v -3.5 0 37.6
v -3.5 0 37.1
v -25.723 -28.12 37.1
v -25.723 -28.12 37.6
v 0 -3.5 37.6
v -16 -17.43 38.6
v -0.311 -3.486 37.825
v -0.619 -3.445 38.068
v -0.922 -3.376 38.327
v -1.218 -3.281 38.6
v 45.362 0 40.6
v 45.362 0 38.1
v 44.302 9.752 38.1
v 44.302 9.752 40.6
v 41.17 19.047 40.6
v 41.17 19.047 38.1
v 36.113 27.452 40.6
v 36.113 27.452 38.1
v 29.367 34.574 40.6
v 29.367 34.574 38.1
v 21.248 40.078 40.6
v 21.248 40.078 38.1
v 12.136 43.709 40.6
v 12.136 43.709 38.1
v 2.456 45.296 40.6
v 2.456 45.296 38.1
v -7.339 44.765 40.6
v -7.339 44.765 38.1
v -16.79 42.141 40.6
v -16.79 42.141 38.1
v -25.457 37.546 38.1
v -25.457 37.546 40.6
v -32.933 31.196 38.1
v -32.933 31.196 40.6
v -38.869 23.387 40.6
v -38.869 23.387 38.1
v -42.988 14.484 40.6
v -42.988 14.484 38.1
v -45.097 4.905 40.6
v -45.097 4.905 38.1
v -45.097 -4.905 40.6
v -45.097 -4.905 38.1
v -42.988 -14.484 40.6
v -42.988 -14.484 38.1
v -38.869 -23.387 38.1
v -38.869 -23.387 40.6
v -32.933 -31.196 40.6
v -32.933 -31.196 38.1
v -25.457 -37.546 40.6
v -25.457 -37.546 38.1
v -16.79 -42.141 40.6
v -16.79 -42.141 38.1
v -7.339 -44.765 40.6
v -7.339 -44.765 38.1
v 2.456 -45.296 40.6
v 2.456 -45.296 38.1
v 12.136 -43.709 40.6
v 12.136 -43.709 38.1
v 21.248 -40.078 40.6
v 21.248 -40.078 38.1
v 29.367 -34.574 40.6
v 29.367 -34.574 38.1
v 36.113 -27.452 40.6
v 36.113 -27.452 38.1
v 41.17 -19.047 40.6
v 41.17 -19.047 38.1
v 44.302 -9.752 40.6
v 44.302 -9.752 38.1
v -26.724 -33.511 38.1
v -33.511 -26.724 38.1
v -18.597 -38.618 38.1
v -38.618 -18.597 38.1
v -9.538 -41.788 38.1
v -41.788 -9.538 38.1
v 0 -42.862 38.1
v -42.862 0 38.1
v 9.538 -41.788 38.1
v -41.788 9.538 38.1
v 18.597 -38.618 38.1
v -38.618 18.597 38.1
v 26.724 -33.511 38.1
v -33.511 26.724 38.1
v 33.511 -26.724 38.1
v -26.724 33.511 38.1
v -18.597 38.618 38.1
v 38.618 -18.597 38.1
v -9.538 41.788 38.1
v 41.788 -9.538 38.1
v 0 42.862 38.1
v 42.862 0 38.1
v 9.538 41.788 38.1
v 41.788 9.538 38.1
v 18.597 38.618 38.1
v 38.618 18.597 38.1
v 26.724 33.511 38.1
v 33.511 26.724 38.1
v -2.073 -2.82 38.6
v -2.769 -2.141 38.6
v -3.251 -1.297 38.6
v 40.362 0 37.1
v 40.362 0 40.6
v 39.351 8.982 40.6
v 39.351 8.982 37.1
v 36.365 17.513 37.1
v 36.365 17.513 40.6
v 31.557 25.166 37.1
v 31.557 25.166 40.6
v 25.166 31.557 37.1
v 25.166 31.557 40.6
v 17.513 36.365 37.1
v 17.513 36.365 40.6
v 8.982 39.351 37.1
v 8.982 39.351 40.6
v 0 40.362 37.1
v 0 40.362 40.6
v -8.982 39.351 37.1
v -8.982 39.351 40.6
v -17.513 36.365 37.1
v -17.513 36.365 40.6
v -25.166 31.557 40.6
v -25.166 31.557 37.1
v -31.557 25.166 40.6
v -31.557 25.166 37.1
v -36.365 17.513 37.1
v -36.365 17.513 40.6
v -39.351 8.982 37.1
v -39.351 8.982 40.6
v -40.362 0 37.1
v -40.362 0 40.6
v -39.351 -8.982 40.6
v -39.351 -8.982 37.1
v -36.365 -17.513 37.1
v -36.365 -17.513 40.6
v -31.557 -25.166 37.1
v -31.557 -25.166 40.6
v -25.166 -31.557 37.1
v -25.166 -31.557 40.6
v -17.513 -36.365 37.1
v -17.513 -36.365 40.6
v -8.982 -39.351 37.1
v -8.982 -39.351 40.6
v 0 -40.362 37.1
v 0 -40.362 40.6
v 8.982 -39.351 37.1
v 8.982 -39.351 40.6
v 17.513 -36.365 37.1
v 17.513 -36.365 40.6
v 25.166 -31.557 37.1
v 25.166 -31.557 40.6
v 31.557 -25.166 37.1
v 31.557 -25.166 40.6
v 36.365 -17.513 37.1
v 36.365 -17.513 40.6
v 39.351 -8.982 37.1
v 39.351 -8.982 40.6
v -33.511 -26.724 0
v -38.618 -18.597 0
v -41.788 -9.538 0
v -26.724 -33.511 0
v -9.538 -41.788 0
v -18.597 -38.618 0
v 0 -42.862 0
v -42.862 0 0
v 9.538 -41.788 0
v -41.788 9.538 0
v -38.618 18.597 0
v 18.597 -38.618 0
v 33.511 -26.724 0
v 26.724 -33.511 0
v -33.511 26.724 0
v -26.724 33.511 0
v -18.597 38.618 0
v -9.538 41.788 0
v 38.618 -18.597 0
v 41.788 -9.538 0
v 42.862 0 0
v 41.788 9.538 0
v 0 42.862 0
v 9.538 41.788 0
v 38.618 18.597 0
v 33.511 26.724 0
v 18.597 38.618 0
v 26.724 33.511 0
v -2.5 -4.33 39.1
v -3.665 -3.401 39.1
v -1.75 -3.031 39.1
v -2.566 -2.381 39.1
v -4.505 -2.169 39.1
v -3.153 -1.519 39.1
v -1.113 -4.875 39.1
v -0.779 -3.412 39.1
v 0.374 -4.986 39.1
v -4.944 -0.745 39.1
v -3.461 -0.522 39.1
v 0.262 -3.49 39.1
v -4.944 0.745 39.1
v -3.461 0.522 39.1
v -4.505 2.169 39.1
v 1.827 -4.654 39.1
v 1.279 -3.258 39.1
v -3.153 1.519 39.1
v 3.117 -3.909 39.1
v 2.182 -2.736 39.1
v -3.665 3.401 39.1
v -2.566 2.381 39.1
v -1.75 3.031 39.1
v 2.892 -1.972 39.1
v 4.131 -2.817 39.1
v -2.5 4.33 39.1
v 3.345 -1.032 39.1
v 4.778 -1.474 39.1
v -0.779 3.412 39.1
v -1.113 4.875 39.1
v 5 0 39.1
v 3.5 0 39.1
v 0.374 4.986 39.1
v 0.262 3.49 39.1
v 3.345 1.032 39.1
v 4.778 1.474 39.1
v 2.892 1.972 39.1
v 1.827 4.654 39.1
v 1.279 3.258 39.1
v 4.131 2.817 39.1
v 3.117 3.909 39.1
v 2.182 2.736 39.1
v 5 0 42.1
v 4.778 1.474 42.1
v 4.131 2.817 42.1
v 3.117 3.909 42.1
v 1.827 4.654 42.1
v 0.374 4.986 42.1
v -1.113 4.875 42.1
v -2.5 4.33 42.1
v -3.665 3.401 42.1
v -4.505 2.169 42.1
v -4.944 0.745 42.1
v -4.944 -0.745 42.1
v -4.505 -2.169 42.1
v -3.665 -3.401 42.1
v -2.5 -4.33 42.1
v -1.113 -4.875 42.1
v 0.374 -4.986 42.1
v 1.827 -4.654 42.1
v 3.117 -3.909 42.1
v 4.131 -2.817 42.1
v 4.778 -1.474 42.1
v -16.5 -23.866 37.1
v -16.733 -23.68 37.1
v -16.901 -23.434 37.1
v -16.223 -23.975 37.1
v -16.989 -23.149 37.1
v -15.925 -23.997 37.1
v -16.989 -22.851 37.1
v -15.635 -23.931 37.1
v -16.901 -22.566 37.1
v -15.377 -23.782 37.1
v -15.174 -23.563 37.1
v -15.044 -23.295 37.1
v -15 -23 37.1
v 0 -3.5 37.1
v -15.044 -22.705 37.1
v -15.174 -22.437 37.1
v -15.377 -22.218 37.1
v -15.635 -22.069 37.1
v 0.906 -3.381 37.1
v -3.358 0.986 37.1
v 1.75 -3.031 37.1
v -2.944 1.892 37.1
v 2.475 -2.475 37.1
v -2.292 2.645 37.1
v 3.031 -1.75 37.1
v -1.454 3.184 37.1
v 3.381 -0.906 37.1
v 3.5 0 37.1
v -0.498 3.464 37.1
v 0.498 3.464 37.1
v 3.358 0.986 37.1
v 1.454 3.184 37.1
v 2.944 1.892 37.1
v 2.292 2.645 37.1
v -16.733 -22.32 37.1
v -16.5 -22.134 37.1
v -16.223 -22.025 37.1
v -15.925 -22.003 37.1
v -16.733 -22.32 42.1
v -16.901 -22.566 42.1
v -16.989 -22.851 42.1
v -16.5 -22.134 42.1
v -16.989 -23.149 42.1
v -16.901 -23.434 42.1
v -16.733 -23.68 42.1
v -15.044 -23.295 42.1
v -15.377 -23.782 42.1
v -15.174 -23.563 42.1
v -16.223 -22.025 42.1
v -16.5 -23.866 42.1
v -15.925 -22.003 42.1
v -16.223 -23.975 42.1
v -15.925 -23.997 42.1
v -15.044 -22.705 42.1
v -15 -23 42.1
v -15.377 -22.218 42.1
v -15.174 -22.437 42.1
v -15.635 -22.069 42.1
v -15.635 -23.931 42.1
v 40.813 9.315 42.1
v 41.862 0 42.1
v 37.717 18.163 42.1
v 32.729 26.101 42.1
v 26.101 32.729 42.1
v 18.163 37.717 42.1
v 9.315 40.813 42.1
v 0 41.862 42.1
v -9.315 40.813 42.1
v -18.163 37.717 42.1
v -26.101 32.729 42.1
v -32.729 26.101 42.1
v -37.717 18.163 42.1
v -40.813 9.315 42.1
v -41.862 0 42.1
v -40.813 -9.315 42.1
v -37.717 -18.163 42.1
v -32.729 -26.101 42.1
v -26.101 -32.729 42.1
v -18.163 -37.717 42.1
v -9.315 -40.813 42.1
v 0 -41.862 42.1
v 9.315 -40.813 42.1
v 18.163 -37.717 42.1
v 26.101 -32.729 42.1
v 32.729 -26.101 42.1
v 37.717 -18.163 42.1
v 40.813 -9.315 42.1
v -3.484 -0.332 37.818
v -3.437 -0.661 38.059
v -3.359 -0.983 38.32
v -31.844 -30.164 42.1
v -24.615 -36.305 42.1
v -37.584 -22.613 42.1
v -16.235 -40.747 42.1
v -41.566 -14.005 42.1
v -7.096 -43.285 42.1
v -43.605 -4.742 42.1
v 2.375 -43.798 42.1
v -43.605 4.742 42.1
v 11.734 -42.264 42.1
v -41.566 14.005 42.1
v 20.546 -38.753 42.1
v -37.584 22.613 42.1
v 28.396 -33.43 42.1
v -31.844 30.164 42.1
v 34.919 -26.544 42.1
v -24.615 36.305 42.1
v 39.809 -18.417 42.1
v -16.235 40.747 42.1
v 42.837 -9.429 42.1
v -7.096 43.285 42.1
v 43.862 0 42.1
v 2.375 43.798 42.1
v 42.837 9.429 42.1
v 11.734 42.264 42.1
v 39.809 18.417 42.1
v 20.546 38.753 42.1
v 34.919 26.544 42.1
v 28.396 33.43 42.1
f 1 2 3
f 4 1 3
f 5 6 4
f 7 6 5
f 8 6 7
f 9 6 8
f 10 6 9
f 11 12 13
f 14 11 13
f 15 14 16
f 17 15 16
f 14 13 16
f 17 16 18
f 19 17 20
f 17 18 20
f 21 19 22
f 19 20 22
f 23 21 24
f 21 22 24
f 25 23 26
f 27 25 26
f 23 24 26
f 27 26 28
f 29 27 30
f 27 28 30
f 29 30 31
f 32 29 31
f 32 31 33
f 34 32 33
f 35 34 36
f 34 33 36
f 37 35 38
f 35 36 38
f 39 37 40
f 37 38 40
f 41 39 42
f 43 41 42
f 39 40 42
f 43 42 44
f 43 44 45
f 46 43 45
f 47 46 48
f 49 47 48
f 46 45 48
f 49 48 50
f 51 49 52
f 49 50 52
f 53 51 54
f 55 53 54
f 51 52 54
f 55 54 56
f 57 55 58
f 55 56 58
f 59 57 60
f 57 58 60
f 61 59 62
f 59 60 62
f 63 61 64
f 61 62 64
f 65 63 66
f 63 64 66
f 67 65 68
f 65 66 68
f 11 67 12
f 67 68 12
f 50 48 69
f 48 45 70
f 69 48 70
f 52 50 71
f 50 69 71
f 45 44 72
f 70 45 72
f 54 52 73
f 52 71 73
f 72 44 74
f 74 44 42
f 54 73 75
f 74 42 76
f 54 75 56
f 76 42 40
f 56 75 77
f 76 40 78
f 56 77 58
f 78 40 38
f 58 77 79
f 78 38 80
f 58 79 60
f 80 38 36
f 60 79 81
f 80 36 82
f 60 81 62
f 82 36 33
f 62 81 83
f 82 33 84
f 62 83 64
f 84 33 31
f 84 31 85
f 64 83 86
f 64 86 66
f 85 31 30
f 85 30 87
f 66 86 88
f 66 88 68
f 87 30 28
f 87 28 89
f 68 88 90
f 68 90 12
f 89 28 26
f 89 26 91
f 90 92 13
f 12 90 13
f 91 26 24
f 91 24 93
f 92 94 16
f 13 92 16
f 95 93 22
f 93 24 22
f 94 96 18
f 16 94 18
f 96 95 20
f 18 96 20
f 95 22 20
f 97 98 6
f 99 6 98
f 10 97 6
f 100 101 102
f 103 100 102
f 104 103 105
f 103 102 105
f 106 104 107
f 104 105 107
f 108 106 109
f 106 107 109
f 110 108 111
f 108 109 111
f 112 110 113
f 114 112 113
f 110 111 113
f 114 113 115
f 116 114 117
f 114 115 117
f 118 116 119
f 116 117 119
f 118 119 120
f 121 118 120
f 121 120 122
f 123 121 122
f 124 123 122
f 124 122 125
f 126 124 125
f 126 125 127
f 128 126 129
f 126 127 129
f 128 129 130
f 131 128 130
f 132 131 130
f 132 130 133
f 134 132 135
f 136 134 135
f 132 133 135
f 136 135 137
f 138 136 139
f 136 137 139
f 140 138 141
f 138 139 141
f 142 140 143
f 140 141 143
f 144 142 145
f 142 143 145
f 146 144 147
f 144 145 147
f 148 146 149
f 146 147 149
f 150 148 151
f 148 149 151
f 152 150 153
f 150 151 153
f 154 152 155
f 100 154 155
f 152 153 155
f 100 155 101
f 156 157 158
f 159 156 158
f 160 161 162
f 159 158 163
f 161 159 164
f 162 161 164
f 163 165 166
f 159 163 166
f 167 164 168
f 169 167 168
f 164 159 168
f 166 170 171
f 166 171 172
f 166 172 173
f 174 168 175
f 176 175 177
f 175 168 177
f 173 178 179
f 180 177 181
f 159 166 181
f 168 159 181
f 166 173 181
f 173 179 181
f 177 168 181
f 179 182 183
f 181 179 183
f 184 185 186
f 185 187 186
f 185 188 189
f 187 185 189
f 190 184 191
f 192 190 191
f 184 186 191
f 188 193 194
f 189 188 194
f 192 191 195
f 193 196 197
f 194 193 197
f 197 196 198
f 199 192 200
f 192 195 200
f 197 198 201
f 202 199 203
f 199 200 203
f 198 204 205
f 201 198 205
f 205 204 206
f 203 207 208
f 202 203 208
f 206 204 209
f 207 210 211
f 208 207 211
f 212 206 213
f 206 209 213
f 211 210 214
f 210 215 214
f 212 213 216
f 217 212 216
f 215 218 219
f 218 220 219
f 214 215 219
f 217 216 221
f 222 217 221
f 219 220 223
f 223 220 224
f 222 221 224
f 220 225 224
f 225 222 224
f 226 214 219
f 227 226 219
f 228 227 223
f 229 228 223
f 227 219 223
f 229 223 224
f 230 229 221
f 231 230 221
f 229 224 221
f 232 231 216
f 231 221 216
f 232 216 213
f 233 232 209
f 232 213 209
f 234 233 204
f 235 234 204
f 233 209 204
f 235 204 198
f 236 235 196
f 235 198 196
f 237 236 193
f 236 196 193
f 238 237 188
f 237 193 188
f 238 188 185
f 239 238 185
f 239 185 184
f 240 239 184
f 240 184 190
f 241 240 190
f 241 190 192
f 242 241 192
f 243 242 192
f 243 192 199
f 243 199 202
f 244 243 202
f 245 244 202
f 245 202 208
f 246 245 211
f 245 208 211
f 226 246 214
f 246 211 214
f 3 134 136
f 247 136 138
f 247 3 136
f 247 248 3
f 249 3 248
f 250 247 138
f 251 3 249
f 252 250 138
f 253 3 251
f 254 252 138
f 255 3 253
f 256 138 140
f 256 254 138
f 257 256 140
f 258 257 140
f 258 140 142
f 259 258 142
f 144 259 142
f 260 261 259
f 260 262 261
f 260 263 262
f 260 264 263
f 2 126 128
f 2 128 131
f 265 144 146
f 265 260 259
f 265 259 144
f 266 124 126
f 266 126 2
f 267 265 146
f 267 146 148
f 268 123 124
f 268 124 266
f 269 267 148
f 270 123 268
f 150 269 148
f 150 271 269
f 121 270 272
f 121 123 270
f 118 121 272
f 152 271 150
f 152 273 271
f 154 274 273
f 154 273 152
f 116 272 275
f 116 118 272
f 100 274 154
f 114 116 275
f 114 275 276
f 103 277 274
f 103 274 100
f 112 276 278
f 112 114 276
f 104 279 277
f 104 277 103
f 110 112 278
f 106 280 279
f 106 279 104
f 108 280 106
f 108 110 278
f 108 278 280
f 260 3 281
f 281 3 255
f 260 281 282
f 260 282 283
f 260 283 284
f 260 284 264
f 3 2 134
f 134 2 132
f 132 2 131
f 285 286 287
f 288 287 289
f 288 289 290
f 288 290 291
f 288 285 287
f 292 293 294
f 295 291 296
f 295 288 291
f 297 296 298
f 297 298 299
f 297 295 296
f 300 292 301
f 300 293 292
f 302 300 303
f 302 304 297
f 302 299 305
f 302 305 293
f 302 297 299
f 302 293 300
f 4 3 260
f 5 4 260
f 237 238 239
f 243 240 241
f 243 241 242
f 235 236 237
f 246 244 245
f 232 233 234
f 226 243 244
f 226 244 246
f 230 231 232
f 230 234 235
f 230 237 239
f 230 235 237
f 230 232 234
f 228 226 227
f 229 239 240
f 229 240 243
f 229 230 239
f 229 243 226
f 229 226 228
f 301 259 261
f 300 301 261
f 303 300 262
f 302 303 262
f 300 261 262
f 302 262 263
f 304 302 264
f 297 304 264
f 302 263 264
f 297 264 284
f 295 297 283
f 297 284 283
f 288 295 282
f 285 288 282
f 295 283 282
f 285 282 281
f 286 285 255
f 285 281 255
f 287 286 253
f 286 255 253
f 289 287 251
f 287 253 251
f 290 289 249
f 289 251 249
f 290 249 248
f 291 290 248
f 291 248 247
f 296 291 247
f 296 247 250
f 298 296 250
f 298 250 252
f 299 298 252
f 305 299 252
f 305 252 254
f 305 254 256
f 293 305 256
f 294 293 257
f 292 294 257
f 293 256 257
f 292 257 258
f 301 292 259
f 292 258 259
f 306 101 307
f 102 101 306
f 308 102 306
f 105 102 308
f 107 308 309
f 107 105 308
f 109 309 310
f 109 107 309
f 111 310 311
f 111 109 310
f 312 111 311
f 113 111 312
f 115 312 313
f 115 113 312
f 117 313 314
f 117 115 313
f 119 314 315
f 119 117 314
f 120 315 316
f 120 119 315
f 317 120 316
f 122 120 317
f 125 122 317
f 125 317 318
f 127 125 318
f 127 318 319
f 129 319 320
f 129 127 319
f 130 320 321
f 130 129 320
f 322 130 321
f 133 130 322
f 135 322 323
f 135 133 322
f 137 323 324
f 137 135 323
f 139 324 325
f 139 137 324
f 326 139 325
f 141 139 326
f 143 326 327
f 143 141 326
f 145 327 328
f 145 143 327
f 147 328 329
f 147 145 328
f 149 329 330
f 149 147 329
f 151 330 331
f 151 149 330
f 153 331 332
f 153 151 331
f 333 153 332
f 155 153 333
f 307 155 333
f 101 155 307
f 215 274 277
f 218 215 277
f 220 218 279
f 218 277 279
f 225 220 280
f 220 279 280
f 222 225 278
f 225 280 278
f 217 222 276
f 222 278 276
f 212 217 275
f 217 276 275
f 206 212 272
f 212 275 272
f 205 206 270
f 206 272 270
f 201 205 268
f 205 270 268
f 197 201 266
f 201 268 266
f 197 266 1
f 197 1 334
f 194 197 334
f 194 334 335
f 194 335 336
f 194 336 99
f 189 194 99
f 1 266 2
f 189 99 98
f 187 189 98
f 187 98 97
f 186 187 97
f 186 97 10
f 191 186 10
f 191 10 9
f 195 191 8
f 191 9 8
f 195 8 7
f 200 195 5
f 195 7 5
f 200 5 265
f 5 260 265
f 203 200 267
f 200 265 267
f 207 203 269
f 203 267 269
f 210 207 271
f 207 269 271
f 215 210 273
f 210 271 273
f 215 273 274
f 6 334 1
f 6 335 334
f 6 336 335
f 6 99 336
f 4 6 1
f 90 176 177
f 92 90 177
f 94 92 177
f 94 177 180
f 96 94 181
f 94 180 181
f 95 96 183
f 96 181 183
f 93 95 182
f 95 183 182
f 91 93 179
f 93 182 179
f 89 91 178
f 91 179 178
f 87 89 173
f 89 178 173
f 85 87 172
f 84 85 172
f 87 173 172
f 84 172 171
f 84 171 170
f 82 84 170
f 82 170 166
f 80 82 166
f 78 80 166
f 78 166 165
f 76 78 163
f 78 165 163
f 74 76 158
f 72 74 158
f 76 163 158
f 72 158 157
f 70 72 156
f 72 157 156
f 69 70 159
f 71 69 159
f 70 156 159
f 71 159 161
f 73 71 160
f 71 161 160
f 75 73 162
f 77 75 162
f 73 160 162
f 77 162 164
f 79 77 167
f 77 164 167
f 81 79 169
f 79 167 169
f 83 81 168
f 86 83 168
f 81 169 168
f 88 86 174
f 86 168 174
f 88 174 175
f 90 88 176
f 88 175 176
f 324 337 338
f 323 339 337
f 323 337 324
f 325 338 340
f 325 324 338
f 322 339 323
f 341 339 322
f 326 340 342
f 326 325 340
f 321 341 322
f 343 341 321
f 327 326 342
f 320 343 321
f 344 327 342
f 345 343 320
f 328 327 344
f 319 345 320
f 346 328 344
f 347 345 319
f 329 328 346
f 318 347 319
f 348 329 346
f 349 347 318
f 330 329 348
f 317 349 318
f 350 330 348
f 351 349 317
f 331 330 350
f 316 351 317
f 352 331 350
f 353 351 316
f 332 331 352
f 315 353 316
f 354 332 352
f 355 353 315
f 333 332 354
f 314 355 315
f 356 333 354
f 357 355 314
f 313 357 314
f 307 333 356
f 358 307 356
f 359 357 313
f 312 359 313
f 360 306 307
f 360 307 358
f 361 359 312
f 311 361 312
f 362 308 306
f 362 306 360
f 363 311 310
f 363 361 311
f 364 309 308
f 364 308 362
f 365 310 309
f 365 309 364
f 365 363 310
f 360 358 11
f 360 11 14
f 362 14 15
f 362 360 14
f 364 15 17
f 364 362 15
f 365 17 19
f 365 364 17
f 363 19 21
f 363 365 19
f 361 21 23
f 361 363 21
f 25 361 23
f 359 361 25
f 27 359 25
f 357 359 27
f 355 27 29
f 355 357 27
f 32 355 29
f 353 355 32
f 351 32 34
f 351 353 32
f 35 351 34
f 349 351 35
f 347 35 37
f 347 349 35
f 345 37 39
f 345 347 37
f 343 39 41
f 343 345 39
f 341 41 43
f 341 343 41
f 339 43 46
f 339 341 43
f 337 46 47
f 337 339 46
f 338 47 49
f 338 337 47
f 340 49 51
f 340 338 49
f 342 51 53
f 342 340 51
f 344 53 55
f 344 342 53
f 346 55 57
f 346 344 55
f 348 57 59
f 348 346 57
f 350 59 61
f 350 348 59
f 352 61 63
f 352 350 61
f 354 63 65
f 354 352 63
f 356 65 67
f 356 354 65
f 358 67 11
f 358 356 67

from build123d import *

# Parameters (mm, degrees)
F0_R      = 42.8625
F1_DEPTH  = 38.1
F2_R      = 45.3625
F3_DEPTH  = 4
F4_R      = 40.3625
F5_DEPTH  = 5
F6_SIZE   = 1.5
F7_R      = 3.5
F8_DEPTH  = 2
F9_R      = 5
F10_DEPTH = 3
F12_DEPTH = 1.5
F13_SIZE  = 1
F14_R     = 1
F15_DEPTH = 5


with BuildPart() as f1:
    # F0 (on Top) → F1 (new body)
    with BuildSketch(Plane.XY):
        Circle(F0_R)
    extrude(amount=F1_DEPTH)

    # F2 (on face) → F3 (join)
    with BuildSketch(Plane.XY.offset(38.1)):
        Circle(F2_R)
    extrude(amount=F3_DEPTH)

    # F4 (on face) → F5 (cut)
    with BuildSketch(Plane.XY.offset(42.1)):
        Circle(F4_R)
    extrude(amount=-F5_DEPTH, mode=Mode.SUBTRACT)

    # F6
    f6_edges = [f1.edges().sort_by_distance(p)[0] for p in [
        (-45.3625, 0, 42.1),
        (-40.3625, 0, 42.1),
    ]]
    chamfer(f6_edges, length=F6_SIZE)

    # F7 (on face) → F8 (join)
    with BuildSketch(Plane.XY.offset(37.1)):
        Circle(F7_R)
    extrude(amount=F8_DEPTH)

    # F9 (on face) → F10 (join)
    with BuildSketch(Plane.XY.offset(39.1)):
        Circle(F9_R)
    extrude(amount=F10_DEPTH)

    # F11 (on face) → F12 (join)
    with BuildSketch(Plane.XY.offset(37.1)):
        Polygon((0, -3.5), (-3.5, 0), (-25.72323, -28.12019), align=None)
    extrude(amount=F12_DEPTH)

    # F13
    f13_edges = [f1.edges().sort_by_distance(p)[0] for p in [
        (-12.861615, -15.810095, 38.6),
        (-14.611615, -14.060095, 38.6),
    ]]
    chamfer(f13_edges, length=F13_SIZE)

    # F14 (on face) → F15 (join)
    with BuildSketch(Plane.XY.offset(37.1)):
        with Locations((-16, -23)):
            Circle(F14_R)
    extrude(amount=F15_DEPTH)


solid = f1.part
